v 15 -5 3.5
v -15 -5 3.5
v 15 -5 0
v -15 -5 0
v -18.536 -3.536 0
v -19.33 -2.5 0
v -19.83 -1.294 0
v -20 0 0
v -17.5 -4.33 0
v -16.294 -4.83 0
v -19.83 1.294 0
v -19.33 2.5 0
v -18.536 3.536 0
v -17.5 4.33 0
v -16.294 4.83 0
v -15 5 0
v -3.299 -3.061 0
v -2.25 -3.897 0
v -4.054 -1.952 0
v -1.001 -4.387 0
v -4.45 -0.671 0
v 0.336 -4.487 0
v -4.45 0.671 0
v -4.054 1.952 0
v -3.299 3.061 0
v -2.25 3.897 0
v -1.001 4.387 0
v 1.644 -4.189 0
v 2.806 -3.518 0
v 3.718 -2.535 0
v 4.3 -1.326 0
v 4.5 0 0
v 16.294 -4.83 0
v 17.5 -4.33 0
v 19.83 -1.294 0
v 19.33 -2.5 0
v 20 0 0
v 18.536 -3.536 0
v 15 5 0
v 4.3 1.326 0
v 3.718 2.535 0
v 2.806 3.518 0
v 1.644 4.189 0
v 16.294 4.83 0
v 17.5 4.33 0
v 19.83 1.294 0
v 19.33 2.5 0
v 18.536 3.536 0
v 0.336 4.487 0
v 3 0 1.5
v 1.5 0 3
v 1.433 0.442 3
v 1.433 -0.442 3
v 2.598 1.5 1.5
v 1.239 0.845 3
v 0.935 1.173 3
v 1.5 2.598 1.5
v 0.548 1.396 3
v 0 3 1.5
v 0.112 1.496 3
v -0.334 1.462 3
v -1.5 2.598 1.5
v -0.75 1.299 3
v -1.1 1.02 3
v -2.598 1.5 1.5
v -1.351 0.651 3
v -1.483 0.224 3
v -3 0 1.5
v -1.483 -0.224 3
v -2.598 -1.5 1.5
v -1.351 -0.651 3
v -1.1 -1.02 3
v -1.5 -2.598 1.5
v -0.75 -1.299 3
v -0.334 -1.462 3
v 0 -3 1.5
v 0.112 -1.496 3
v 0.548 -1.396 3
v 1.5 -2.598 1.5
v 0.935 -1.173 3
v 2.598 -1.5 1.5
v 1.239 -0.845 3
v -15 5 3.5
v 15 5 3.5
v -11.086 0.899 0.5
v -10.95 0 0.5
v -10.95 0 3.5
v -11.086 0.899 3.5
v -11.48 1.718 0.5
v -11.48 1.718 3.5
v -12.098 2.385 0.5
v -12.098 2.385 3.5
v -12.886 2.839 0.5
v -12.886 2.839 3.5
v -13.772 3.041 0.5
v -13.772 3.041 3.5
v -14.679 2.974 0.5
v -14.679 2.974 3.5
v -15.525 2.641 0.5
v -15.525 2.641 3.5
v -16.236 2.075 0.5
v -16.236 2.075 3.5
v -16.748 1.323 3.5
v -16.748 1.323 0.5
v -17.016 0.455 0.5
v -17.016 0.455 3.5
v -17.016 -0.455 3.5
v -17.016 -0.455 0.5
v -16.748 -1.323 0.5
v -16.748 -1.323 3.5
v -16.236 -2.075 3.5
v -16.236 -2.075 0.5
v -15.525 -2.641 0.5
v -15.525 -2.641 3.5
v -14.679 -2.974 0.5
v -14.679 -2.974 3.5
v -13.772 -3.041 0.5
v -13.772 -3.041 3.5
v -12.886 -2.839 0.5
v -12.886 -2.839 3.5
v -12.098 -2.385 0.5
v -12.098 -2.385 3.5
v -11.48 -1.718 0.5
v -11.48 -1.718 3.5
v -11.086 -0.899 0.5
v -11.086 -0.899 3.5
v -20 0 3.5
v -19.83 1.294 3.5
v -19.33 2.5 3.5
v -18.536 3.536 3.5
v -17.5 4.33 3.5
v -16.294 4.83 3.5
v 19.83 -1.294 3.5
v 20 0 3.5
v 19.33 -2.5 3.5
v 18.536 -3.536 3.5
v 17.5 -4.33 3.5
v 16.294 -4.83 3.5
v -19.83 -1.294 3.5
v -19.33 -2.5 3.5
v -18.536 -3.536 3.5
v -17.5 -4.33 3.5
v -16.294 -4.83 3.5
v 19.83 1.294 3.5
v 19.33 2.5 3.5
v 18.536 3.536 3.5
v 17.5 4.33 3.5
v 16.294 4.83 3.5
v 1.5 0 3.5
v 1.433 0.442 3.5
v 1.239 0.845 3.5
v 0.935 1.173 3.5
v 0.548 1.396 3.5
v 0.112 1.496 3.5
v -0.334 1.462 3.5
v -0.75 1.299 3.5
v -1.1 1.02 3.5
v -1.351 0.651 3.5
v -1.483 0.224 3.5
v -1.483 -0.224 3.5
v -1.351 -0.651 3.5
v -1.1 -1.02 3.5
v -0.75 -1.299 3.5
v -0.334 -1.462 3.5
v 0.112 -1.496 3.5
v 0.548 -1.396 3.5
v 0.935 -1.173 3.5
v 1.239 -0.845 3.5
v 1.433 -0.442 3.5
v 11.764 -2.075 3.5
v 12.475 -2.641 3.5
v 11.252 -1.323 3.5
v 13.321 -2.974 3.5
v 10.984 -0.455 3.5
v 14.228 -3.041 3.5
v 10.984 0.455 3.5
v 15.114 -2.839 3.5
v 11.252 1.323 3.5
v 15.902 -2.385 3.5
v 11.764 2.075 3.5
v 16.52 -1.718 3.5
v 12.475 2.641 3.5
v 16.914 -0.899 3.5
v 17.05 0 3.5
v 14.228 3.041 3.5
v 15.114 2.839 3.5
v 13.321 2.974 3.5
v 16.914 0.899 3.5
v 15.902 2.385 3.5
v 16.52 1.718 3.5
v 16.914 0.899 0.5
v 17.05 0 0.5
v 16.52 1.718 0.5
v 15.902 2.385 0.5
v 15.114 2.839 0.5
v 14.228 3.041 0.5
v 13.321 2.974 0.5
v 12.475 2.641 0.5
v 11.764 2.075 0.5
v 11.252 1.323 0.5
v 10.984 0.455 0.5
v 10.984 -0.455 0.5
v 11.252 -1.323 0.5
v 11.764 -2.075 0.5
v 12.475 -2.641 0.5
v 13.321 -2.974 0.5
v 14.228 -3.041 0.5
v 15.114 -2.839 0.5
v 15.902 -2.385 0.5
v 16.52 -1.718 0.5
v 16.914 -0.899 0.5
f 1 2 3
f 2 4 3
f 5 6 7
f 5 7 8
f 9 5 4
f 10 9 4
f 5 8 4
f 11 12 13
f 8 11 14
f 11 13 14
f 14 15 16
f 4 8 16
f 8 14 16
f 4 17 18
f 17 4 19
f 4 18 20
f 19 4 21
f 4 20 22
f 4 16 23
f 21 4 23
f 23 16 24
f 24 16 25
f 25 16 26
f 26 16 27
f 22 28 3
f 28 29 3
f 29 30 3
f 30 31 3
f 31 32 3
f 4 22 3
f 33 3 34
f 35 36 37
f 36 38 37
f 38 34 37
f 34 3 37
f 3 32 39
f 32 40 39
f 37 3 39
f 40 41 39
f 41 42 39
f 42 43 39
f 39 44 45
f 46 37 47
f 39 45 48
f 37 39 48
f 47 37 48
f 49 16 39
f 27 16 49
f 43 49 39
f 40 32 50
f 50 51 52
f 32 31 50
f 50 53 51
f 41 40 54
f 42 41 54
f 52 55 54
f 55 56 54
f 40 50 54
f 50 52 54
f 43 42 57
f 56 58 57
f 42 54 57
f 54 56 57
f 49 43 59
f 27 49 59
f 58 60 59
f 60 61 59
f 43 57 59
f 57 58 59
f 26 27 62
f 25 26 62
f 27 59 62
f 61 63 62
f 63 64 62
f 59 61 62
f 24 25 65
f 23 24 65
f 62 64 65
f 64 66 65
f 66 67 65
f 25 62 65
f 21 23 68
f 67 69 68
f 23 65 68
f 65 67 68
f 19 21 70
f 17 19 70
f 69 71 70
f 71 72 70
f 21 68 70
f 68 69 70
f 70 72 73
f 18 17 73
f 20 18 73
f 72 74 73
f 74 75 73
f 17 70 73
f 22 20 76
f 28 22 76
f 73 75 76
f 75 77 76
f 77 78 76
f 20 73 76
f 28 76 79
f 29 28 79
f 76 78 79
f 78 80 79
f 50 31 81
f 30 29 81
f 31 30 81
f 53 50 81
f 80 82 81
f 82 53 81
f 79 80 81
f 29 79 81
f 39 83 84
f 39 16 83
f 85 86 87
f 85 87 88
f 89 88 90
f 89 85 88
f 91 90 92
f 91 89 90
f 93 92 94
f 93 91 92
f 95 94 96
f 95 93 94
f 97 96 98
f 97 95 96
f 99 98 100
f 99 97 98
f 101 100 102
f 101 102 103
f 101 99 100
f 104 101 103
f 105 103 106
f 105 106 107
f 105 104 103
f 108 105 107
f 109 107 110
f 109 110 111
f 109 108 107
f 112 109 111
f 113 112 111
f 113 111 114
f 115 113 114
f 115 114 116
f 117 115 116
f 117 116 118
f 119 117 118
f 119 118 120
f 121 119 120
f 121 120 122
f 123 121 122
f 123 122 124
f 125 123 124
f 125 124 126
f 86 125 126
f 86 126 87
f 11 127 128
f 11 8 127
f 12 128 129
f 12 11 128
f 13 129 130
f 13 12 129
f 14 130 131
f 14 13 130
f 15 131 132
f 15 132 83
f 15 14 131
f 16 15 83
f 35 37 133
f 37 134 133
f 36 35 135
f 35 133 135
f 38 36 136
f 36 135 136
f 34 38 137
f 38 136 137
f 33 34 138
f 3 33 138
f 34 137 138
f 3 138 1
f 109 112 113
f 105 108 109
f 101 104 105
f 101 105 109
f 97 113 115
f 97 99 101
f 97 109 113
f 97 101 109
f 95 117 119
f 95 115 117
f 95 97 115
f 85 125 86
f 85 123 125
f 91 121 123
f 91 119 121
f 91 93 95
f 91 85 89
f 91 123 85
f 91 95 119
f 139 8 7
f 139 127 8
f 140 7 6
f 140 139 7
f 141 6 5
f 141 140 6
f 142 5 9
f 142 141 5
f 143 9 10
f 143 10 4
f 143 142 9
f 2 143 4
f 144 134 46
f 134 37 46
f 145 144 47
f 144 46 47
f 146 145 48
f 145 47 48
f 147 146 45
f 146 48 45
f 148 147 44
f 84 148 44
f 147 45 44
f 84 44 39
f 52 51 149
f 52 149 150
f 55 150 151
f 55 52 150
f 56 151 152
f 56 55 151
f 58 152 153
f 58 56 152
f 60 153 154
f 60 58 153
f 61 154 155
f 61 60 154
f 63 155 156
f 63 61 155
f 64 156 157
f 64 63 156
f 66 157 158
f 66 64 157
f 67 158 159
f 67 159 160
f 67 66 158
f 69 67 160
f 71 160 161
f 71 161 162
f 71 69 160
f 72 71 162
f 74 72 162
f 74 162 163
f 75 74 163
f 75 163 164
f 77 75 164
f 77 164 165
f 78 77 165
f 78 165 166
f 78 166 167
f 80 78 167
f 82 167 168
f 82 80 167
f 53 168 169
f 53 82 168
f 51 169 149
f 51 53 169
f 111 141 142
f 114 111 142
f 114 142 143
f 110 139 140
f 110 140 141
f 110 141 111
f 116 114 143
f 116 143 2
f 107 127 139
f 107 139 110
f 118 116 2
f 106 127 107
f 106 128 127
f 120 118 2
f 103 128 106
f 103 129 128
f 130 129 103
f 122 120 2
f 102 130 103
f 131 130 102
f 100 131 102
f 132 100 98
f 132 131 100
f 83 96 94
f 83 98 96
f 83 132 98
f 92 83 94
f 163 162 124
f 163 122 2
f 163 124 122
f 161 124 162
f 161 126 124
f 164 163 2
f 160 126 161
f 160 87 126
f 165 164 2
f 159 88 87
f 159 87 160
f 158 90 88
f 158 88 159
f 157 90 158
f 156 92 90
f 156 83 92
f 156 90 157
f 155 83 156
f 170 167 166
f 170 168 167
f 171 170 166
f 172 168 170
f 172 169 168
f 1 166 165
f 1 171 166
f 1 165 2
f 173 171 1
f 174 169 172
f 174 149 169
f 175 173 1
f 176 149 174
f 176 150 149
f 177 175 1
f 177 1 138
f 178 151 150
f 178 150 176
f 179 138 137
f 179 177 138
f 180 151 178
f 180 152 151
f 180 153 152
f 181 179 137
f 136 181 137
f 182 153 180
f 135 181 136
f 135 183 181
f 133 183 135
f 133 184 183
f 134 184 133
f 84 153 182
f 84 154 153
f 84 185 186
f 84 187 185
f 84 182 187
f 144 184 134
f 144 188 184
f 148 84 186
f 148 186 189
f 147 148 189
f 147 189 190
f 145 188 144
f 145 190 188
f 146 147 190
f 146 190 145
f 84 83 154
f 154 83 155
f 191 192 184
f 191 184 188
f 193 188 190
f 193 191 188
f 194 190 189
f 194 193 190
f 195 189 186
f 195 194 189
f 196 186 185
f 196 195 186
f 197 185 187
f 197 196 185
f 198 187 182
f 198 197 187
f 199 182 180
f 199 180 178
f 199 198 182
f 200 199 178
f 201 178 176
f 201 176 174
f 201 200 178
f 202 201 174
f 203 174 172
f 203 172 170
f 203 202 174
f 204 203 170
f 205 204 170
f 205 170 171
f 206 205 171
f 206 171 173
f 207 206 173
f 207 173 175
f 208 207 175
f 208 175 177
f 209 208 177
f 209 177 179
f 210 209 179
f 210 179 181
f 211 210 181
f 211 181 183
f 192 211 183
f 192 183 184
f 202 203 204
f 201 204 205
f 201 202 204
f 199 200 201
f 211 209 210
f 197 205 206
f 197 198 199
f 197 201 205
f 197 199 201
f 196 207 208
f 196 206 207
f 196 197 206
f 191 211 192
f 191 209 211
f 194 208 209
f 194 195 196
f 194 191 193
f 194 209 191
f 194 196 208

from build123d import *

# Parameters (mm, degrees)
F0_W     = 40
F0_H     = 10
F0_R     = 3.05
F0_R_2   = 1.5
F1_DEPTH = 0.5
F2_DEPTH = 3.5
F3_R     = 4.99999
F4_SIZE  = 3


# Not quite as in the source:
# - a fillet or chamfer is up to 0.001 mm smaller than in the source, because OpenCascade refuses the exact size


with BuildPart() as f1:
    # F0 (on Top) → F1 (new body)
    with BuildSketch(Plane.XY):
        Rectangle(F0_W, F0_H)
        with Locations((-14, 0)):
            Circle(F0_R, mode=Mode.SUBTRACT)
        Circle(F0_R_2, mode=Mode.SUBTRACT)
        with Locations((14, 0)):
            Circle(F0_R, mode=Mode.SUBTRACT)
        with Locations((-14, 0)):
            Circle(F0_R)
        with Locations((14, 0)):
            Circle(F0_R)
    extrude(amount=F1_DEPTH)

    # F0 (on Top) → F2 (join)
    with BuildSketch(Plane.XY):
        Rectangle(F0_W, F0_H)
        with Locations((-14, 0)):
            Circle(F0_R, mode=Mode.SUBTRACT)
        Circle(F0_R_2, mode=Mode.SUBTRACT)
        with Locations((14, 0)):
            Circle(F0_R, mode=Mode.SUBTRACT)
    extrude(amount=F2_DEPTH)

    # F3 (radius 5 in the source; OpenCascade refuses exactly that, so slightly less here)
    f3_edges = [f1.edges().sort_by_distance(p)[0] for p in [
        (20, 5, 1.75),
        (20, -5, 1.75),
        (-20, -5, 1.75),
        (-20, 5, 1.75),
    ]]
    fillet(f3_edges, radius=F3_R)

    # F4
    f4_edges = [f1.edges().sort_by_distance(p)[0] for p in [
        (-1.5, 0, 0),
    ]]
    chamfer(f4_edges, length=F4_SIZE)


solid = f1.part
